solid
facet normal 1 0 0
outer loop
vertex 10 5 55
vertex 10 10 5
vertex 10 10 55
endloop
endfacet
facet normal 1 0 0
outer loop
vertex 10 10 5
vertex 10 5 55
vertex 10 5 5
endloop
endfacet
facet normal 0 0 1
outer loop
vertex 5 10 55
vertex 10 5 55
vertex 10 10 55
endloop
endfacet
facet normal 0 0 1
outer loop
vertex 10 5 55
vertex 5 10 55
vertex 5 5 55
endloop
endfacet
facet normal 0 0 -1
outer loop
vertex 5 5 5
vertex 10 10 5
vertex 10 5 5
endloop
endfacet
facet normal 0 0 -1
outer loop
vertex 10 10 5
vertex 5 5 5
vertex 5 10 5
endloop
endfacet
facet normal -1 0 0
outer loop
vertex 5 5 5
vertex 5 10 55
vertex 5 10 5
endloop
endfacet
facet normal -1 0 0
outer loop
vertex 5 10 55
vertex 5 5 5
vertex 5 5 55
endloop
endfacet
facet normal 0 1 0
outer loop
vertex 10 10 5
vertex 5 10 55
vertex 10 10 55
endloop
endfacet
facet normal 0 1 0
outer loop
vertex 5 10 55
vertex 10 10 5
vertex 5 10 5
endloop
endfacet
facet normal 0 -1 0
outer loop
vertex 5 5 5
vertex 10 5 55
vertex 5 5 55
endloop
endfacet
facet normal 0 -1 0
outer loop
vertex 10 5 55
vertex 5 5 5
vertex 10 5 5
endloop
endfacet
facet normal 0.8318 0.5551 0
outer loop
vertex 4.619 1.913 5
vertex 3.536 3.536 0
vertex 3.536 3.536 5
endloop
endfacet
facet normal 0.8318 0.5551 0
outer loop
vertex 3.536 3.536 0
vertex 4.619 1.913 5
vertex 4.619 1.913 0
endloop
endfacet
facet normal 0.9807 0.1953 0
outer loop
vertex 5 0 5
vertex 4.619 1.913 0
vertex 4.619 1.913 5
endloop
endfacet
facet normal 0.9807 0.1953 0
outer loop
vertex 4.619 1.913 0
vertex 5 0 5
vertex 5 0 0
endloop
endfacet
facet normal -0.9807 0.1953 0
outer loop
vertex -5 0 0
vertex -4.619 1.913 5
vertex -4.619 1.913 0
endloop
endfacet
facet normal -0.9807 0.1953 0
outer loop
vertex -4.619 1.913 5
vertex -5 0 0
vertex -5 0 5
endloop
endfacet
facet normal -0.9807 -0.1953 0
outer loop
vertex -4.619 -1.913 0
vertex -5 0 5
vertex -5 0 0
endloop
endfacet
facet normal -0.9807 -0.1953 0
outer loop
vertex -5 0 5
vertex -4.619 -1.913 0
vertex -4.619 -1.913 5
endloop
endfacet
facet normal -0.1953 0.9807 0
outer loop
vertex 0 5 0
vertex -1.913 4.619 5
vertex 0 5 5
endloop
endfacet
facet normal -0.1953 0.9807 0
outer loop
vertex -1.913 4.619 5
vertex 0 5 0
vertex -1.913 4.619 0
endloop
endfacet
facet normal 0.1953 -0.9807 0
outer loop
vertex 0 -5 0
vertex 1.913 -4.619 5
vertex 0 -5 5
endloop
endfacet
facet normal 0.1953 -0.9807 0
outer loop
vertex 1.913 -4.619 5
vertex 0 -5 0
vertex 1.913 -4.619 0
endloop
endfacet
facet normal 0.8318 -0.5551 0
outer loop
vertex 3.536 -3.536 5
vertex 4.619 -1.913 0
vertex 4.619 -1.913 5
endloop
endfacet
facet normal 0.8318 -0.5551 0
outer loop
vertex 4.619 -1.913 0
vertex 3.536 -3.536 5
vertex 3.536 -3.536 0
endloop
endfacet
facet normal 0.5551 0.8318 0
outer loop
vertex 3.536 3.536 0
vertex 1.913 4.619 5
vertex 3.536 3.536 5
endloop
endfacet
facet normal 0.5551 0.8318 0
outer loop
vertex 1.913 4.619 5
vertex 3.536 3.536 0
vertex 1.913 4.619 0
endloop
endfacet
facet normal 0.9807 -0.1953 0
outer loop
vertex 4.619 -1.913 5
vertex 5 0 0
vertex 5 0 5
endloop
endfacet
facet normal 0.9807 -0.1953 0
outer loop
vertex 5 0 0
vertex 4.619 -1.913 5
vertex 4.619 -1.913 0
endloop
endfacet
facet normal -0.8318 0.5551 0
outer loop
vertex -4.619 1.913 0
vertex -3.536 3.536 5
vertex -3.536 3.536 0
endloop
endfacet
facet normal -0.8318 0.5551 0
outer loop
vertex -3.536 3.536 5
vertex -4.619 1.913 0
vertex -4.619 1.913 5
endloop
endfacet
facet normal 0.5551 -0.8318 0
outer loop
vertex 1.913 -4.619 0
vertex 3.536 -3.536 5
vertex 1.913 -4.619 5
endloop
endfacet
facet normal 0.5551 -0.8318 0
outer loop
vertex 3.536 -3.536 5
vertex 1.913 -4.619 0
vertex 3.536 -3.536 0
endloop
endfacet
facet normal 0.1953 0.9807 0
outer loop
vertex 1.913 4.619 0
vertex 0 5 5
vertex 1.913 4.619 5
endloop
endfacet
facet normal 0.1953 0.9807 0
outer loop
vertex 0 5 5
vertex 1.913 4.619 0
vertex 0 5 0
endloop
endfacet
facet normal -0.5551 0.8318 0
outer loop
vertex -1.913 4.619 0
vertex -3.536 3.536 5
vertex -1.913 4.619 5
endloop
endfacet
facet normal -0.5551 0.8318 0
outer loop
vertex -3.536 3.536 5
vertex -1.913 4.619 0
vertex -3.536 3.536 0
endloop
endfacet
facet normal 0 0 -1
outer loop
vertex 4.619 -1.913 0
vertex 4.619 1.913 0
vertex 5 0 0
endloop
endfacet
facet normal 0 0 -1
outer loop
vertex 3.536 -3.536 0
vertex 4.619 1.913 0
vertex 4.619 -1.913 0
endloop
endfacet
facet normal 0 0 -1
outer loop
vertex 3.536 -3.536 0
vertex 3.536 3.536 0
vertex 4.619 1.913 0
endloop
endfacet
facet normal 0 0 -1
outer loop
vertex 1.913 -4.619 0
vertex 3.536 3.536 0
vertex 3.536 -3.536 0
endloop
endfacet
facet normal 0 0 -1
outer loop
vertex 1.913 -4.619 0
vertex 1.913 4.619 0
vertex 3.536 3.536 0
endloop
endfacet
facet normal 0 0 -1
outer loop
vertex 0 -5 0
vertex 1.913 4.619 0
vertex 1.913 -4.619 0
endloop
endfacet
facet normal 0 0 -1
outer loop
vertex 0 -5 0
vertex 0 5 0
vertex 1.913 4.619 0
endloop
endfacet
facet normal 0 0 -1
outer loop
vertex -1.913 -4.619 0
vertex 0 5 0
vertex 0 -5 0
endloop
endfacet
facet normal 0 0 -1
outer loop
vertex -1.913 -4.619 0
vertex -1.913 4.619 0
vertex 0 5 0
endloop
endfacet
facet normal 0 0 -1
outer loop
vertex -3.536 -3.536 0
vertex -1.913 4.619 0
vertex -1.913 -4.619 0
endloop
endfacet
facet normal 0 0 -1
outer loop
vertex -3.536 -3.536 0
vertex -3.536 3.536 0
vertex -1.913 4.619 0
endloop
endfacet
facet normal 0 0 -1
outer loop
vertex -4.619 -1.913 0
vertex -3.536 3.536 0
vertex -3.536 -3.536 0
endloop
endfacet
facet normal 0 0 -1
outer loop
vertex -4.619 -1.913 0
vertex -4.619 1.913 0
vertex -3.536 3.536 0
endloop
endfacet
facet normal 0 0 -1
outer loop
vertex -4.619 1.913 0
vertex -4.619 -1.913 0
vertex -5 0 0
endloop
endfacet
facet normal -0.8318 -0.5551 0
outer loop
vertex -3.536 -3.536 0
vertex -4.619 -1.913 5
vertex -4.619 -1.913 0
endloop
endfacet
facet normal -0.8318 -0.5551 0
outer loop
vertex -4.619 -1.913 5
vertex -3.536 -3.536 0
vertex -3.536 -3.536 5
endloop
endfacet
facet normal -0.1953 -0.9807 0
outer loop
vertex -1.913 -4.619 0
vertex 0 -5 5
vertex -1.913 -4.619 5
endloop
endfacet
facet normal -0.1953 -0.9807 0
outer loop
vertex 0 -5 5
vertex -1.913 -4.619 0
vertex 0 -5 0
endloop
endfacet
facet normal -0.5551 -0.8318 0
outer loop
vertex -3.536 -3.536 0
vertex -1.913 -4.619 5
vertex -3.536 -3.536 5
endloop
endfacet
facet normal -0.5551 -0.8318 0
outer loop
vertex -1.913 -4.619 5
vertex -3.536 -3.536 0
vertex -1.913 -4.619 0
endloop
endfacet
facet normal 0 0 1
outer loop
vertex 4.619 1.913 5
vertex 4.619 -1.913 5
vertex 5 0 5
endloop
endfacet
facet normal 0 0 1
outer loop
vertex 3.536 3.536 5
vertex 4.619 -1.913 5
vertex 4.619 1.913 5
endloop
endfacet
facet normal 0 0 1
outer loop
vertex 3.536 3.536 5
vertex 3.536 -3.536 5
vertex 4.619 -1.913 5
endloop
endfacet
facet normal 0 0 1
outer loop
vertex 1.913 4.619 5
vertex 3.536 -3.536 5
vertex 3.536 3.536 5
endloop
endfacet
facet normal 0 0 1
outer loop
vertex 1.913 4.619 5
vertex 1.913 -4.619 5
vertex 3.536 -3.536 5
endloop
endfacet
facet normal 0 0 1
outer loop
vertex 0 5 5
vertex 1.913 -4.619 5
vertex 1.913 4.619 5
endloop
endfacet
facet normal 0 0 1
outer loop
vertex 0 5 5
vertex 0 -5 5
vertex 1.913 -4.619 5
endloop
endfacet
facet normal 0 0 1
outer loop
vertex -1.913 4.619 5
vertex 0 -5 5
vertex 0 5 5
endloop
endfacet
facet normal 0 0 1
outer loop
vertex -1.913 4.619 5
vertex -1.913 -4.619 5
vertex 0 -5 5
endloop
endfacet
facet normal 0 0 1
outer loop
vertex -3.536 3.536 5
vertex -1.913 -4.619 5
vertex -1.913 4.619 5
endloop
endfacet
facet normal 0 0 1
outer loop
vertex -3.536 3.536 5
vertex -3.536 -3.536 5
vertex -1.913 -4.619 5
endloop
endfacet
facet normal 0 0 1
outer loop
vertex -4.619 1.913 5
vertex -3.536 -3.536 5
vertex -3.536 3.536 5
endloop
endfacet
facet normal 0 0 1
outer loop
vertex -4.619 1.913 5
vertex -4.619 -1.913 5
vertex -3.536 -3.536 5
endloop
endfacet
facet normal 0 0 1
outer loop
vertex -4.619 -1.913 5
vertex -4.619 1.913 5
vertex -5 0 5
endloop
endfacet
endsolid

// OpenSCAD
translate([5, 5, 5]) {
	cube([5, 5, 50]);
}
cylinder(d=10, h=5);
